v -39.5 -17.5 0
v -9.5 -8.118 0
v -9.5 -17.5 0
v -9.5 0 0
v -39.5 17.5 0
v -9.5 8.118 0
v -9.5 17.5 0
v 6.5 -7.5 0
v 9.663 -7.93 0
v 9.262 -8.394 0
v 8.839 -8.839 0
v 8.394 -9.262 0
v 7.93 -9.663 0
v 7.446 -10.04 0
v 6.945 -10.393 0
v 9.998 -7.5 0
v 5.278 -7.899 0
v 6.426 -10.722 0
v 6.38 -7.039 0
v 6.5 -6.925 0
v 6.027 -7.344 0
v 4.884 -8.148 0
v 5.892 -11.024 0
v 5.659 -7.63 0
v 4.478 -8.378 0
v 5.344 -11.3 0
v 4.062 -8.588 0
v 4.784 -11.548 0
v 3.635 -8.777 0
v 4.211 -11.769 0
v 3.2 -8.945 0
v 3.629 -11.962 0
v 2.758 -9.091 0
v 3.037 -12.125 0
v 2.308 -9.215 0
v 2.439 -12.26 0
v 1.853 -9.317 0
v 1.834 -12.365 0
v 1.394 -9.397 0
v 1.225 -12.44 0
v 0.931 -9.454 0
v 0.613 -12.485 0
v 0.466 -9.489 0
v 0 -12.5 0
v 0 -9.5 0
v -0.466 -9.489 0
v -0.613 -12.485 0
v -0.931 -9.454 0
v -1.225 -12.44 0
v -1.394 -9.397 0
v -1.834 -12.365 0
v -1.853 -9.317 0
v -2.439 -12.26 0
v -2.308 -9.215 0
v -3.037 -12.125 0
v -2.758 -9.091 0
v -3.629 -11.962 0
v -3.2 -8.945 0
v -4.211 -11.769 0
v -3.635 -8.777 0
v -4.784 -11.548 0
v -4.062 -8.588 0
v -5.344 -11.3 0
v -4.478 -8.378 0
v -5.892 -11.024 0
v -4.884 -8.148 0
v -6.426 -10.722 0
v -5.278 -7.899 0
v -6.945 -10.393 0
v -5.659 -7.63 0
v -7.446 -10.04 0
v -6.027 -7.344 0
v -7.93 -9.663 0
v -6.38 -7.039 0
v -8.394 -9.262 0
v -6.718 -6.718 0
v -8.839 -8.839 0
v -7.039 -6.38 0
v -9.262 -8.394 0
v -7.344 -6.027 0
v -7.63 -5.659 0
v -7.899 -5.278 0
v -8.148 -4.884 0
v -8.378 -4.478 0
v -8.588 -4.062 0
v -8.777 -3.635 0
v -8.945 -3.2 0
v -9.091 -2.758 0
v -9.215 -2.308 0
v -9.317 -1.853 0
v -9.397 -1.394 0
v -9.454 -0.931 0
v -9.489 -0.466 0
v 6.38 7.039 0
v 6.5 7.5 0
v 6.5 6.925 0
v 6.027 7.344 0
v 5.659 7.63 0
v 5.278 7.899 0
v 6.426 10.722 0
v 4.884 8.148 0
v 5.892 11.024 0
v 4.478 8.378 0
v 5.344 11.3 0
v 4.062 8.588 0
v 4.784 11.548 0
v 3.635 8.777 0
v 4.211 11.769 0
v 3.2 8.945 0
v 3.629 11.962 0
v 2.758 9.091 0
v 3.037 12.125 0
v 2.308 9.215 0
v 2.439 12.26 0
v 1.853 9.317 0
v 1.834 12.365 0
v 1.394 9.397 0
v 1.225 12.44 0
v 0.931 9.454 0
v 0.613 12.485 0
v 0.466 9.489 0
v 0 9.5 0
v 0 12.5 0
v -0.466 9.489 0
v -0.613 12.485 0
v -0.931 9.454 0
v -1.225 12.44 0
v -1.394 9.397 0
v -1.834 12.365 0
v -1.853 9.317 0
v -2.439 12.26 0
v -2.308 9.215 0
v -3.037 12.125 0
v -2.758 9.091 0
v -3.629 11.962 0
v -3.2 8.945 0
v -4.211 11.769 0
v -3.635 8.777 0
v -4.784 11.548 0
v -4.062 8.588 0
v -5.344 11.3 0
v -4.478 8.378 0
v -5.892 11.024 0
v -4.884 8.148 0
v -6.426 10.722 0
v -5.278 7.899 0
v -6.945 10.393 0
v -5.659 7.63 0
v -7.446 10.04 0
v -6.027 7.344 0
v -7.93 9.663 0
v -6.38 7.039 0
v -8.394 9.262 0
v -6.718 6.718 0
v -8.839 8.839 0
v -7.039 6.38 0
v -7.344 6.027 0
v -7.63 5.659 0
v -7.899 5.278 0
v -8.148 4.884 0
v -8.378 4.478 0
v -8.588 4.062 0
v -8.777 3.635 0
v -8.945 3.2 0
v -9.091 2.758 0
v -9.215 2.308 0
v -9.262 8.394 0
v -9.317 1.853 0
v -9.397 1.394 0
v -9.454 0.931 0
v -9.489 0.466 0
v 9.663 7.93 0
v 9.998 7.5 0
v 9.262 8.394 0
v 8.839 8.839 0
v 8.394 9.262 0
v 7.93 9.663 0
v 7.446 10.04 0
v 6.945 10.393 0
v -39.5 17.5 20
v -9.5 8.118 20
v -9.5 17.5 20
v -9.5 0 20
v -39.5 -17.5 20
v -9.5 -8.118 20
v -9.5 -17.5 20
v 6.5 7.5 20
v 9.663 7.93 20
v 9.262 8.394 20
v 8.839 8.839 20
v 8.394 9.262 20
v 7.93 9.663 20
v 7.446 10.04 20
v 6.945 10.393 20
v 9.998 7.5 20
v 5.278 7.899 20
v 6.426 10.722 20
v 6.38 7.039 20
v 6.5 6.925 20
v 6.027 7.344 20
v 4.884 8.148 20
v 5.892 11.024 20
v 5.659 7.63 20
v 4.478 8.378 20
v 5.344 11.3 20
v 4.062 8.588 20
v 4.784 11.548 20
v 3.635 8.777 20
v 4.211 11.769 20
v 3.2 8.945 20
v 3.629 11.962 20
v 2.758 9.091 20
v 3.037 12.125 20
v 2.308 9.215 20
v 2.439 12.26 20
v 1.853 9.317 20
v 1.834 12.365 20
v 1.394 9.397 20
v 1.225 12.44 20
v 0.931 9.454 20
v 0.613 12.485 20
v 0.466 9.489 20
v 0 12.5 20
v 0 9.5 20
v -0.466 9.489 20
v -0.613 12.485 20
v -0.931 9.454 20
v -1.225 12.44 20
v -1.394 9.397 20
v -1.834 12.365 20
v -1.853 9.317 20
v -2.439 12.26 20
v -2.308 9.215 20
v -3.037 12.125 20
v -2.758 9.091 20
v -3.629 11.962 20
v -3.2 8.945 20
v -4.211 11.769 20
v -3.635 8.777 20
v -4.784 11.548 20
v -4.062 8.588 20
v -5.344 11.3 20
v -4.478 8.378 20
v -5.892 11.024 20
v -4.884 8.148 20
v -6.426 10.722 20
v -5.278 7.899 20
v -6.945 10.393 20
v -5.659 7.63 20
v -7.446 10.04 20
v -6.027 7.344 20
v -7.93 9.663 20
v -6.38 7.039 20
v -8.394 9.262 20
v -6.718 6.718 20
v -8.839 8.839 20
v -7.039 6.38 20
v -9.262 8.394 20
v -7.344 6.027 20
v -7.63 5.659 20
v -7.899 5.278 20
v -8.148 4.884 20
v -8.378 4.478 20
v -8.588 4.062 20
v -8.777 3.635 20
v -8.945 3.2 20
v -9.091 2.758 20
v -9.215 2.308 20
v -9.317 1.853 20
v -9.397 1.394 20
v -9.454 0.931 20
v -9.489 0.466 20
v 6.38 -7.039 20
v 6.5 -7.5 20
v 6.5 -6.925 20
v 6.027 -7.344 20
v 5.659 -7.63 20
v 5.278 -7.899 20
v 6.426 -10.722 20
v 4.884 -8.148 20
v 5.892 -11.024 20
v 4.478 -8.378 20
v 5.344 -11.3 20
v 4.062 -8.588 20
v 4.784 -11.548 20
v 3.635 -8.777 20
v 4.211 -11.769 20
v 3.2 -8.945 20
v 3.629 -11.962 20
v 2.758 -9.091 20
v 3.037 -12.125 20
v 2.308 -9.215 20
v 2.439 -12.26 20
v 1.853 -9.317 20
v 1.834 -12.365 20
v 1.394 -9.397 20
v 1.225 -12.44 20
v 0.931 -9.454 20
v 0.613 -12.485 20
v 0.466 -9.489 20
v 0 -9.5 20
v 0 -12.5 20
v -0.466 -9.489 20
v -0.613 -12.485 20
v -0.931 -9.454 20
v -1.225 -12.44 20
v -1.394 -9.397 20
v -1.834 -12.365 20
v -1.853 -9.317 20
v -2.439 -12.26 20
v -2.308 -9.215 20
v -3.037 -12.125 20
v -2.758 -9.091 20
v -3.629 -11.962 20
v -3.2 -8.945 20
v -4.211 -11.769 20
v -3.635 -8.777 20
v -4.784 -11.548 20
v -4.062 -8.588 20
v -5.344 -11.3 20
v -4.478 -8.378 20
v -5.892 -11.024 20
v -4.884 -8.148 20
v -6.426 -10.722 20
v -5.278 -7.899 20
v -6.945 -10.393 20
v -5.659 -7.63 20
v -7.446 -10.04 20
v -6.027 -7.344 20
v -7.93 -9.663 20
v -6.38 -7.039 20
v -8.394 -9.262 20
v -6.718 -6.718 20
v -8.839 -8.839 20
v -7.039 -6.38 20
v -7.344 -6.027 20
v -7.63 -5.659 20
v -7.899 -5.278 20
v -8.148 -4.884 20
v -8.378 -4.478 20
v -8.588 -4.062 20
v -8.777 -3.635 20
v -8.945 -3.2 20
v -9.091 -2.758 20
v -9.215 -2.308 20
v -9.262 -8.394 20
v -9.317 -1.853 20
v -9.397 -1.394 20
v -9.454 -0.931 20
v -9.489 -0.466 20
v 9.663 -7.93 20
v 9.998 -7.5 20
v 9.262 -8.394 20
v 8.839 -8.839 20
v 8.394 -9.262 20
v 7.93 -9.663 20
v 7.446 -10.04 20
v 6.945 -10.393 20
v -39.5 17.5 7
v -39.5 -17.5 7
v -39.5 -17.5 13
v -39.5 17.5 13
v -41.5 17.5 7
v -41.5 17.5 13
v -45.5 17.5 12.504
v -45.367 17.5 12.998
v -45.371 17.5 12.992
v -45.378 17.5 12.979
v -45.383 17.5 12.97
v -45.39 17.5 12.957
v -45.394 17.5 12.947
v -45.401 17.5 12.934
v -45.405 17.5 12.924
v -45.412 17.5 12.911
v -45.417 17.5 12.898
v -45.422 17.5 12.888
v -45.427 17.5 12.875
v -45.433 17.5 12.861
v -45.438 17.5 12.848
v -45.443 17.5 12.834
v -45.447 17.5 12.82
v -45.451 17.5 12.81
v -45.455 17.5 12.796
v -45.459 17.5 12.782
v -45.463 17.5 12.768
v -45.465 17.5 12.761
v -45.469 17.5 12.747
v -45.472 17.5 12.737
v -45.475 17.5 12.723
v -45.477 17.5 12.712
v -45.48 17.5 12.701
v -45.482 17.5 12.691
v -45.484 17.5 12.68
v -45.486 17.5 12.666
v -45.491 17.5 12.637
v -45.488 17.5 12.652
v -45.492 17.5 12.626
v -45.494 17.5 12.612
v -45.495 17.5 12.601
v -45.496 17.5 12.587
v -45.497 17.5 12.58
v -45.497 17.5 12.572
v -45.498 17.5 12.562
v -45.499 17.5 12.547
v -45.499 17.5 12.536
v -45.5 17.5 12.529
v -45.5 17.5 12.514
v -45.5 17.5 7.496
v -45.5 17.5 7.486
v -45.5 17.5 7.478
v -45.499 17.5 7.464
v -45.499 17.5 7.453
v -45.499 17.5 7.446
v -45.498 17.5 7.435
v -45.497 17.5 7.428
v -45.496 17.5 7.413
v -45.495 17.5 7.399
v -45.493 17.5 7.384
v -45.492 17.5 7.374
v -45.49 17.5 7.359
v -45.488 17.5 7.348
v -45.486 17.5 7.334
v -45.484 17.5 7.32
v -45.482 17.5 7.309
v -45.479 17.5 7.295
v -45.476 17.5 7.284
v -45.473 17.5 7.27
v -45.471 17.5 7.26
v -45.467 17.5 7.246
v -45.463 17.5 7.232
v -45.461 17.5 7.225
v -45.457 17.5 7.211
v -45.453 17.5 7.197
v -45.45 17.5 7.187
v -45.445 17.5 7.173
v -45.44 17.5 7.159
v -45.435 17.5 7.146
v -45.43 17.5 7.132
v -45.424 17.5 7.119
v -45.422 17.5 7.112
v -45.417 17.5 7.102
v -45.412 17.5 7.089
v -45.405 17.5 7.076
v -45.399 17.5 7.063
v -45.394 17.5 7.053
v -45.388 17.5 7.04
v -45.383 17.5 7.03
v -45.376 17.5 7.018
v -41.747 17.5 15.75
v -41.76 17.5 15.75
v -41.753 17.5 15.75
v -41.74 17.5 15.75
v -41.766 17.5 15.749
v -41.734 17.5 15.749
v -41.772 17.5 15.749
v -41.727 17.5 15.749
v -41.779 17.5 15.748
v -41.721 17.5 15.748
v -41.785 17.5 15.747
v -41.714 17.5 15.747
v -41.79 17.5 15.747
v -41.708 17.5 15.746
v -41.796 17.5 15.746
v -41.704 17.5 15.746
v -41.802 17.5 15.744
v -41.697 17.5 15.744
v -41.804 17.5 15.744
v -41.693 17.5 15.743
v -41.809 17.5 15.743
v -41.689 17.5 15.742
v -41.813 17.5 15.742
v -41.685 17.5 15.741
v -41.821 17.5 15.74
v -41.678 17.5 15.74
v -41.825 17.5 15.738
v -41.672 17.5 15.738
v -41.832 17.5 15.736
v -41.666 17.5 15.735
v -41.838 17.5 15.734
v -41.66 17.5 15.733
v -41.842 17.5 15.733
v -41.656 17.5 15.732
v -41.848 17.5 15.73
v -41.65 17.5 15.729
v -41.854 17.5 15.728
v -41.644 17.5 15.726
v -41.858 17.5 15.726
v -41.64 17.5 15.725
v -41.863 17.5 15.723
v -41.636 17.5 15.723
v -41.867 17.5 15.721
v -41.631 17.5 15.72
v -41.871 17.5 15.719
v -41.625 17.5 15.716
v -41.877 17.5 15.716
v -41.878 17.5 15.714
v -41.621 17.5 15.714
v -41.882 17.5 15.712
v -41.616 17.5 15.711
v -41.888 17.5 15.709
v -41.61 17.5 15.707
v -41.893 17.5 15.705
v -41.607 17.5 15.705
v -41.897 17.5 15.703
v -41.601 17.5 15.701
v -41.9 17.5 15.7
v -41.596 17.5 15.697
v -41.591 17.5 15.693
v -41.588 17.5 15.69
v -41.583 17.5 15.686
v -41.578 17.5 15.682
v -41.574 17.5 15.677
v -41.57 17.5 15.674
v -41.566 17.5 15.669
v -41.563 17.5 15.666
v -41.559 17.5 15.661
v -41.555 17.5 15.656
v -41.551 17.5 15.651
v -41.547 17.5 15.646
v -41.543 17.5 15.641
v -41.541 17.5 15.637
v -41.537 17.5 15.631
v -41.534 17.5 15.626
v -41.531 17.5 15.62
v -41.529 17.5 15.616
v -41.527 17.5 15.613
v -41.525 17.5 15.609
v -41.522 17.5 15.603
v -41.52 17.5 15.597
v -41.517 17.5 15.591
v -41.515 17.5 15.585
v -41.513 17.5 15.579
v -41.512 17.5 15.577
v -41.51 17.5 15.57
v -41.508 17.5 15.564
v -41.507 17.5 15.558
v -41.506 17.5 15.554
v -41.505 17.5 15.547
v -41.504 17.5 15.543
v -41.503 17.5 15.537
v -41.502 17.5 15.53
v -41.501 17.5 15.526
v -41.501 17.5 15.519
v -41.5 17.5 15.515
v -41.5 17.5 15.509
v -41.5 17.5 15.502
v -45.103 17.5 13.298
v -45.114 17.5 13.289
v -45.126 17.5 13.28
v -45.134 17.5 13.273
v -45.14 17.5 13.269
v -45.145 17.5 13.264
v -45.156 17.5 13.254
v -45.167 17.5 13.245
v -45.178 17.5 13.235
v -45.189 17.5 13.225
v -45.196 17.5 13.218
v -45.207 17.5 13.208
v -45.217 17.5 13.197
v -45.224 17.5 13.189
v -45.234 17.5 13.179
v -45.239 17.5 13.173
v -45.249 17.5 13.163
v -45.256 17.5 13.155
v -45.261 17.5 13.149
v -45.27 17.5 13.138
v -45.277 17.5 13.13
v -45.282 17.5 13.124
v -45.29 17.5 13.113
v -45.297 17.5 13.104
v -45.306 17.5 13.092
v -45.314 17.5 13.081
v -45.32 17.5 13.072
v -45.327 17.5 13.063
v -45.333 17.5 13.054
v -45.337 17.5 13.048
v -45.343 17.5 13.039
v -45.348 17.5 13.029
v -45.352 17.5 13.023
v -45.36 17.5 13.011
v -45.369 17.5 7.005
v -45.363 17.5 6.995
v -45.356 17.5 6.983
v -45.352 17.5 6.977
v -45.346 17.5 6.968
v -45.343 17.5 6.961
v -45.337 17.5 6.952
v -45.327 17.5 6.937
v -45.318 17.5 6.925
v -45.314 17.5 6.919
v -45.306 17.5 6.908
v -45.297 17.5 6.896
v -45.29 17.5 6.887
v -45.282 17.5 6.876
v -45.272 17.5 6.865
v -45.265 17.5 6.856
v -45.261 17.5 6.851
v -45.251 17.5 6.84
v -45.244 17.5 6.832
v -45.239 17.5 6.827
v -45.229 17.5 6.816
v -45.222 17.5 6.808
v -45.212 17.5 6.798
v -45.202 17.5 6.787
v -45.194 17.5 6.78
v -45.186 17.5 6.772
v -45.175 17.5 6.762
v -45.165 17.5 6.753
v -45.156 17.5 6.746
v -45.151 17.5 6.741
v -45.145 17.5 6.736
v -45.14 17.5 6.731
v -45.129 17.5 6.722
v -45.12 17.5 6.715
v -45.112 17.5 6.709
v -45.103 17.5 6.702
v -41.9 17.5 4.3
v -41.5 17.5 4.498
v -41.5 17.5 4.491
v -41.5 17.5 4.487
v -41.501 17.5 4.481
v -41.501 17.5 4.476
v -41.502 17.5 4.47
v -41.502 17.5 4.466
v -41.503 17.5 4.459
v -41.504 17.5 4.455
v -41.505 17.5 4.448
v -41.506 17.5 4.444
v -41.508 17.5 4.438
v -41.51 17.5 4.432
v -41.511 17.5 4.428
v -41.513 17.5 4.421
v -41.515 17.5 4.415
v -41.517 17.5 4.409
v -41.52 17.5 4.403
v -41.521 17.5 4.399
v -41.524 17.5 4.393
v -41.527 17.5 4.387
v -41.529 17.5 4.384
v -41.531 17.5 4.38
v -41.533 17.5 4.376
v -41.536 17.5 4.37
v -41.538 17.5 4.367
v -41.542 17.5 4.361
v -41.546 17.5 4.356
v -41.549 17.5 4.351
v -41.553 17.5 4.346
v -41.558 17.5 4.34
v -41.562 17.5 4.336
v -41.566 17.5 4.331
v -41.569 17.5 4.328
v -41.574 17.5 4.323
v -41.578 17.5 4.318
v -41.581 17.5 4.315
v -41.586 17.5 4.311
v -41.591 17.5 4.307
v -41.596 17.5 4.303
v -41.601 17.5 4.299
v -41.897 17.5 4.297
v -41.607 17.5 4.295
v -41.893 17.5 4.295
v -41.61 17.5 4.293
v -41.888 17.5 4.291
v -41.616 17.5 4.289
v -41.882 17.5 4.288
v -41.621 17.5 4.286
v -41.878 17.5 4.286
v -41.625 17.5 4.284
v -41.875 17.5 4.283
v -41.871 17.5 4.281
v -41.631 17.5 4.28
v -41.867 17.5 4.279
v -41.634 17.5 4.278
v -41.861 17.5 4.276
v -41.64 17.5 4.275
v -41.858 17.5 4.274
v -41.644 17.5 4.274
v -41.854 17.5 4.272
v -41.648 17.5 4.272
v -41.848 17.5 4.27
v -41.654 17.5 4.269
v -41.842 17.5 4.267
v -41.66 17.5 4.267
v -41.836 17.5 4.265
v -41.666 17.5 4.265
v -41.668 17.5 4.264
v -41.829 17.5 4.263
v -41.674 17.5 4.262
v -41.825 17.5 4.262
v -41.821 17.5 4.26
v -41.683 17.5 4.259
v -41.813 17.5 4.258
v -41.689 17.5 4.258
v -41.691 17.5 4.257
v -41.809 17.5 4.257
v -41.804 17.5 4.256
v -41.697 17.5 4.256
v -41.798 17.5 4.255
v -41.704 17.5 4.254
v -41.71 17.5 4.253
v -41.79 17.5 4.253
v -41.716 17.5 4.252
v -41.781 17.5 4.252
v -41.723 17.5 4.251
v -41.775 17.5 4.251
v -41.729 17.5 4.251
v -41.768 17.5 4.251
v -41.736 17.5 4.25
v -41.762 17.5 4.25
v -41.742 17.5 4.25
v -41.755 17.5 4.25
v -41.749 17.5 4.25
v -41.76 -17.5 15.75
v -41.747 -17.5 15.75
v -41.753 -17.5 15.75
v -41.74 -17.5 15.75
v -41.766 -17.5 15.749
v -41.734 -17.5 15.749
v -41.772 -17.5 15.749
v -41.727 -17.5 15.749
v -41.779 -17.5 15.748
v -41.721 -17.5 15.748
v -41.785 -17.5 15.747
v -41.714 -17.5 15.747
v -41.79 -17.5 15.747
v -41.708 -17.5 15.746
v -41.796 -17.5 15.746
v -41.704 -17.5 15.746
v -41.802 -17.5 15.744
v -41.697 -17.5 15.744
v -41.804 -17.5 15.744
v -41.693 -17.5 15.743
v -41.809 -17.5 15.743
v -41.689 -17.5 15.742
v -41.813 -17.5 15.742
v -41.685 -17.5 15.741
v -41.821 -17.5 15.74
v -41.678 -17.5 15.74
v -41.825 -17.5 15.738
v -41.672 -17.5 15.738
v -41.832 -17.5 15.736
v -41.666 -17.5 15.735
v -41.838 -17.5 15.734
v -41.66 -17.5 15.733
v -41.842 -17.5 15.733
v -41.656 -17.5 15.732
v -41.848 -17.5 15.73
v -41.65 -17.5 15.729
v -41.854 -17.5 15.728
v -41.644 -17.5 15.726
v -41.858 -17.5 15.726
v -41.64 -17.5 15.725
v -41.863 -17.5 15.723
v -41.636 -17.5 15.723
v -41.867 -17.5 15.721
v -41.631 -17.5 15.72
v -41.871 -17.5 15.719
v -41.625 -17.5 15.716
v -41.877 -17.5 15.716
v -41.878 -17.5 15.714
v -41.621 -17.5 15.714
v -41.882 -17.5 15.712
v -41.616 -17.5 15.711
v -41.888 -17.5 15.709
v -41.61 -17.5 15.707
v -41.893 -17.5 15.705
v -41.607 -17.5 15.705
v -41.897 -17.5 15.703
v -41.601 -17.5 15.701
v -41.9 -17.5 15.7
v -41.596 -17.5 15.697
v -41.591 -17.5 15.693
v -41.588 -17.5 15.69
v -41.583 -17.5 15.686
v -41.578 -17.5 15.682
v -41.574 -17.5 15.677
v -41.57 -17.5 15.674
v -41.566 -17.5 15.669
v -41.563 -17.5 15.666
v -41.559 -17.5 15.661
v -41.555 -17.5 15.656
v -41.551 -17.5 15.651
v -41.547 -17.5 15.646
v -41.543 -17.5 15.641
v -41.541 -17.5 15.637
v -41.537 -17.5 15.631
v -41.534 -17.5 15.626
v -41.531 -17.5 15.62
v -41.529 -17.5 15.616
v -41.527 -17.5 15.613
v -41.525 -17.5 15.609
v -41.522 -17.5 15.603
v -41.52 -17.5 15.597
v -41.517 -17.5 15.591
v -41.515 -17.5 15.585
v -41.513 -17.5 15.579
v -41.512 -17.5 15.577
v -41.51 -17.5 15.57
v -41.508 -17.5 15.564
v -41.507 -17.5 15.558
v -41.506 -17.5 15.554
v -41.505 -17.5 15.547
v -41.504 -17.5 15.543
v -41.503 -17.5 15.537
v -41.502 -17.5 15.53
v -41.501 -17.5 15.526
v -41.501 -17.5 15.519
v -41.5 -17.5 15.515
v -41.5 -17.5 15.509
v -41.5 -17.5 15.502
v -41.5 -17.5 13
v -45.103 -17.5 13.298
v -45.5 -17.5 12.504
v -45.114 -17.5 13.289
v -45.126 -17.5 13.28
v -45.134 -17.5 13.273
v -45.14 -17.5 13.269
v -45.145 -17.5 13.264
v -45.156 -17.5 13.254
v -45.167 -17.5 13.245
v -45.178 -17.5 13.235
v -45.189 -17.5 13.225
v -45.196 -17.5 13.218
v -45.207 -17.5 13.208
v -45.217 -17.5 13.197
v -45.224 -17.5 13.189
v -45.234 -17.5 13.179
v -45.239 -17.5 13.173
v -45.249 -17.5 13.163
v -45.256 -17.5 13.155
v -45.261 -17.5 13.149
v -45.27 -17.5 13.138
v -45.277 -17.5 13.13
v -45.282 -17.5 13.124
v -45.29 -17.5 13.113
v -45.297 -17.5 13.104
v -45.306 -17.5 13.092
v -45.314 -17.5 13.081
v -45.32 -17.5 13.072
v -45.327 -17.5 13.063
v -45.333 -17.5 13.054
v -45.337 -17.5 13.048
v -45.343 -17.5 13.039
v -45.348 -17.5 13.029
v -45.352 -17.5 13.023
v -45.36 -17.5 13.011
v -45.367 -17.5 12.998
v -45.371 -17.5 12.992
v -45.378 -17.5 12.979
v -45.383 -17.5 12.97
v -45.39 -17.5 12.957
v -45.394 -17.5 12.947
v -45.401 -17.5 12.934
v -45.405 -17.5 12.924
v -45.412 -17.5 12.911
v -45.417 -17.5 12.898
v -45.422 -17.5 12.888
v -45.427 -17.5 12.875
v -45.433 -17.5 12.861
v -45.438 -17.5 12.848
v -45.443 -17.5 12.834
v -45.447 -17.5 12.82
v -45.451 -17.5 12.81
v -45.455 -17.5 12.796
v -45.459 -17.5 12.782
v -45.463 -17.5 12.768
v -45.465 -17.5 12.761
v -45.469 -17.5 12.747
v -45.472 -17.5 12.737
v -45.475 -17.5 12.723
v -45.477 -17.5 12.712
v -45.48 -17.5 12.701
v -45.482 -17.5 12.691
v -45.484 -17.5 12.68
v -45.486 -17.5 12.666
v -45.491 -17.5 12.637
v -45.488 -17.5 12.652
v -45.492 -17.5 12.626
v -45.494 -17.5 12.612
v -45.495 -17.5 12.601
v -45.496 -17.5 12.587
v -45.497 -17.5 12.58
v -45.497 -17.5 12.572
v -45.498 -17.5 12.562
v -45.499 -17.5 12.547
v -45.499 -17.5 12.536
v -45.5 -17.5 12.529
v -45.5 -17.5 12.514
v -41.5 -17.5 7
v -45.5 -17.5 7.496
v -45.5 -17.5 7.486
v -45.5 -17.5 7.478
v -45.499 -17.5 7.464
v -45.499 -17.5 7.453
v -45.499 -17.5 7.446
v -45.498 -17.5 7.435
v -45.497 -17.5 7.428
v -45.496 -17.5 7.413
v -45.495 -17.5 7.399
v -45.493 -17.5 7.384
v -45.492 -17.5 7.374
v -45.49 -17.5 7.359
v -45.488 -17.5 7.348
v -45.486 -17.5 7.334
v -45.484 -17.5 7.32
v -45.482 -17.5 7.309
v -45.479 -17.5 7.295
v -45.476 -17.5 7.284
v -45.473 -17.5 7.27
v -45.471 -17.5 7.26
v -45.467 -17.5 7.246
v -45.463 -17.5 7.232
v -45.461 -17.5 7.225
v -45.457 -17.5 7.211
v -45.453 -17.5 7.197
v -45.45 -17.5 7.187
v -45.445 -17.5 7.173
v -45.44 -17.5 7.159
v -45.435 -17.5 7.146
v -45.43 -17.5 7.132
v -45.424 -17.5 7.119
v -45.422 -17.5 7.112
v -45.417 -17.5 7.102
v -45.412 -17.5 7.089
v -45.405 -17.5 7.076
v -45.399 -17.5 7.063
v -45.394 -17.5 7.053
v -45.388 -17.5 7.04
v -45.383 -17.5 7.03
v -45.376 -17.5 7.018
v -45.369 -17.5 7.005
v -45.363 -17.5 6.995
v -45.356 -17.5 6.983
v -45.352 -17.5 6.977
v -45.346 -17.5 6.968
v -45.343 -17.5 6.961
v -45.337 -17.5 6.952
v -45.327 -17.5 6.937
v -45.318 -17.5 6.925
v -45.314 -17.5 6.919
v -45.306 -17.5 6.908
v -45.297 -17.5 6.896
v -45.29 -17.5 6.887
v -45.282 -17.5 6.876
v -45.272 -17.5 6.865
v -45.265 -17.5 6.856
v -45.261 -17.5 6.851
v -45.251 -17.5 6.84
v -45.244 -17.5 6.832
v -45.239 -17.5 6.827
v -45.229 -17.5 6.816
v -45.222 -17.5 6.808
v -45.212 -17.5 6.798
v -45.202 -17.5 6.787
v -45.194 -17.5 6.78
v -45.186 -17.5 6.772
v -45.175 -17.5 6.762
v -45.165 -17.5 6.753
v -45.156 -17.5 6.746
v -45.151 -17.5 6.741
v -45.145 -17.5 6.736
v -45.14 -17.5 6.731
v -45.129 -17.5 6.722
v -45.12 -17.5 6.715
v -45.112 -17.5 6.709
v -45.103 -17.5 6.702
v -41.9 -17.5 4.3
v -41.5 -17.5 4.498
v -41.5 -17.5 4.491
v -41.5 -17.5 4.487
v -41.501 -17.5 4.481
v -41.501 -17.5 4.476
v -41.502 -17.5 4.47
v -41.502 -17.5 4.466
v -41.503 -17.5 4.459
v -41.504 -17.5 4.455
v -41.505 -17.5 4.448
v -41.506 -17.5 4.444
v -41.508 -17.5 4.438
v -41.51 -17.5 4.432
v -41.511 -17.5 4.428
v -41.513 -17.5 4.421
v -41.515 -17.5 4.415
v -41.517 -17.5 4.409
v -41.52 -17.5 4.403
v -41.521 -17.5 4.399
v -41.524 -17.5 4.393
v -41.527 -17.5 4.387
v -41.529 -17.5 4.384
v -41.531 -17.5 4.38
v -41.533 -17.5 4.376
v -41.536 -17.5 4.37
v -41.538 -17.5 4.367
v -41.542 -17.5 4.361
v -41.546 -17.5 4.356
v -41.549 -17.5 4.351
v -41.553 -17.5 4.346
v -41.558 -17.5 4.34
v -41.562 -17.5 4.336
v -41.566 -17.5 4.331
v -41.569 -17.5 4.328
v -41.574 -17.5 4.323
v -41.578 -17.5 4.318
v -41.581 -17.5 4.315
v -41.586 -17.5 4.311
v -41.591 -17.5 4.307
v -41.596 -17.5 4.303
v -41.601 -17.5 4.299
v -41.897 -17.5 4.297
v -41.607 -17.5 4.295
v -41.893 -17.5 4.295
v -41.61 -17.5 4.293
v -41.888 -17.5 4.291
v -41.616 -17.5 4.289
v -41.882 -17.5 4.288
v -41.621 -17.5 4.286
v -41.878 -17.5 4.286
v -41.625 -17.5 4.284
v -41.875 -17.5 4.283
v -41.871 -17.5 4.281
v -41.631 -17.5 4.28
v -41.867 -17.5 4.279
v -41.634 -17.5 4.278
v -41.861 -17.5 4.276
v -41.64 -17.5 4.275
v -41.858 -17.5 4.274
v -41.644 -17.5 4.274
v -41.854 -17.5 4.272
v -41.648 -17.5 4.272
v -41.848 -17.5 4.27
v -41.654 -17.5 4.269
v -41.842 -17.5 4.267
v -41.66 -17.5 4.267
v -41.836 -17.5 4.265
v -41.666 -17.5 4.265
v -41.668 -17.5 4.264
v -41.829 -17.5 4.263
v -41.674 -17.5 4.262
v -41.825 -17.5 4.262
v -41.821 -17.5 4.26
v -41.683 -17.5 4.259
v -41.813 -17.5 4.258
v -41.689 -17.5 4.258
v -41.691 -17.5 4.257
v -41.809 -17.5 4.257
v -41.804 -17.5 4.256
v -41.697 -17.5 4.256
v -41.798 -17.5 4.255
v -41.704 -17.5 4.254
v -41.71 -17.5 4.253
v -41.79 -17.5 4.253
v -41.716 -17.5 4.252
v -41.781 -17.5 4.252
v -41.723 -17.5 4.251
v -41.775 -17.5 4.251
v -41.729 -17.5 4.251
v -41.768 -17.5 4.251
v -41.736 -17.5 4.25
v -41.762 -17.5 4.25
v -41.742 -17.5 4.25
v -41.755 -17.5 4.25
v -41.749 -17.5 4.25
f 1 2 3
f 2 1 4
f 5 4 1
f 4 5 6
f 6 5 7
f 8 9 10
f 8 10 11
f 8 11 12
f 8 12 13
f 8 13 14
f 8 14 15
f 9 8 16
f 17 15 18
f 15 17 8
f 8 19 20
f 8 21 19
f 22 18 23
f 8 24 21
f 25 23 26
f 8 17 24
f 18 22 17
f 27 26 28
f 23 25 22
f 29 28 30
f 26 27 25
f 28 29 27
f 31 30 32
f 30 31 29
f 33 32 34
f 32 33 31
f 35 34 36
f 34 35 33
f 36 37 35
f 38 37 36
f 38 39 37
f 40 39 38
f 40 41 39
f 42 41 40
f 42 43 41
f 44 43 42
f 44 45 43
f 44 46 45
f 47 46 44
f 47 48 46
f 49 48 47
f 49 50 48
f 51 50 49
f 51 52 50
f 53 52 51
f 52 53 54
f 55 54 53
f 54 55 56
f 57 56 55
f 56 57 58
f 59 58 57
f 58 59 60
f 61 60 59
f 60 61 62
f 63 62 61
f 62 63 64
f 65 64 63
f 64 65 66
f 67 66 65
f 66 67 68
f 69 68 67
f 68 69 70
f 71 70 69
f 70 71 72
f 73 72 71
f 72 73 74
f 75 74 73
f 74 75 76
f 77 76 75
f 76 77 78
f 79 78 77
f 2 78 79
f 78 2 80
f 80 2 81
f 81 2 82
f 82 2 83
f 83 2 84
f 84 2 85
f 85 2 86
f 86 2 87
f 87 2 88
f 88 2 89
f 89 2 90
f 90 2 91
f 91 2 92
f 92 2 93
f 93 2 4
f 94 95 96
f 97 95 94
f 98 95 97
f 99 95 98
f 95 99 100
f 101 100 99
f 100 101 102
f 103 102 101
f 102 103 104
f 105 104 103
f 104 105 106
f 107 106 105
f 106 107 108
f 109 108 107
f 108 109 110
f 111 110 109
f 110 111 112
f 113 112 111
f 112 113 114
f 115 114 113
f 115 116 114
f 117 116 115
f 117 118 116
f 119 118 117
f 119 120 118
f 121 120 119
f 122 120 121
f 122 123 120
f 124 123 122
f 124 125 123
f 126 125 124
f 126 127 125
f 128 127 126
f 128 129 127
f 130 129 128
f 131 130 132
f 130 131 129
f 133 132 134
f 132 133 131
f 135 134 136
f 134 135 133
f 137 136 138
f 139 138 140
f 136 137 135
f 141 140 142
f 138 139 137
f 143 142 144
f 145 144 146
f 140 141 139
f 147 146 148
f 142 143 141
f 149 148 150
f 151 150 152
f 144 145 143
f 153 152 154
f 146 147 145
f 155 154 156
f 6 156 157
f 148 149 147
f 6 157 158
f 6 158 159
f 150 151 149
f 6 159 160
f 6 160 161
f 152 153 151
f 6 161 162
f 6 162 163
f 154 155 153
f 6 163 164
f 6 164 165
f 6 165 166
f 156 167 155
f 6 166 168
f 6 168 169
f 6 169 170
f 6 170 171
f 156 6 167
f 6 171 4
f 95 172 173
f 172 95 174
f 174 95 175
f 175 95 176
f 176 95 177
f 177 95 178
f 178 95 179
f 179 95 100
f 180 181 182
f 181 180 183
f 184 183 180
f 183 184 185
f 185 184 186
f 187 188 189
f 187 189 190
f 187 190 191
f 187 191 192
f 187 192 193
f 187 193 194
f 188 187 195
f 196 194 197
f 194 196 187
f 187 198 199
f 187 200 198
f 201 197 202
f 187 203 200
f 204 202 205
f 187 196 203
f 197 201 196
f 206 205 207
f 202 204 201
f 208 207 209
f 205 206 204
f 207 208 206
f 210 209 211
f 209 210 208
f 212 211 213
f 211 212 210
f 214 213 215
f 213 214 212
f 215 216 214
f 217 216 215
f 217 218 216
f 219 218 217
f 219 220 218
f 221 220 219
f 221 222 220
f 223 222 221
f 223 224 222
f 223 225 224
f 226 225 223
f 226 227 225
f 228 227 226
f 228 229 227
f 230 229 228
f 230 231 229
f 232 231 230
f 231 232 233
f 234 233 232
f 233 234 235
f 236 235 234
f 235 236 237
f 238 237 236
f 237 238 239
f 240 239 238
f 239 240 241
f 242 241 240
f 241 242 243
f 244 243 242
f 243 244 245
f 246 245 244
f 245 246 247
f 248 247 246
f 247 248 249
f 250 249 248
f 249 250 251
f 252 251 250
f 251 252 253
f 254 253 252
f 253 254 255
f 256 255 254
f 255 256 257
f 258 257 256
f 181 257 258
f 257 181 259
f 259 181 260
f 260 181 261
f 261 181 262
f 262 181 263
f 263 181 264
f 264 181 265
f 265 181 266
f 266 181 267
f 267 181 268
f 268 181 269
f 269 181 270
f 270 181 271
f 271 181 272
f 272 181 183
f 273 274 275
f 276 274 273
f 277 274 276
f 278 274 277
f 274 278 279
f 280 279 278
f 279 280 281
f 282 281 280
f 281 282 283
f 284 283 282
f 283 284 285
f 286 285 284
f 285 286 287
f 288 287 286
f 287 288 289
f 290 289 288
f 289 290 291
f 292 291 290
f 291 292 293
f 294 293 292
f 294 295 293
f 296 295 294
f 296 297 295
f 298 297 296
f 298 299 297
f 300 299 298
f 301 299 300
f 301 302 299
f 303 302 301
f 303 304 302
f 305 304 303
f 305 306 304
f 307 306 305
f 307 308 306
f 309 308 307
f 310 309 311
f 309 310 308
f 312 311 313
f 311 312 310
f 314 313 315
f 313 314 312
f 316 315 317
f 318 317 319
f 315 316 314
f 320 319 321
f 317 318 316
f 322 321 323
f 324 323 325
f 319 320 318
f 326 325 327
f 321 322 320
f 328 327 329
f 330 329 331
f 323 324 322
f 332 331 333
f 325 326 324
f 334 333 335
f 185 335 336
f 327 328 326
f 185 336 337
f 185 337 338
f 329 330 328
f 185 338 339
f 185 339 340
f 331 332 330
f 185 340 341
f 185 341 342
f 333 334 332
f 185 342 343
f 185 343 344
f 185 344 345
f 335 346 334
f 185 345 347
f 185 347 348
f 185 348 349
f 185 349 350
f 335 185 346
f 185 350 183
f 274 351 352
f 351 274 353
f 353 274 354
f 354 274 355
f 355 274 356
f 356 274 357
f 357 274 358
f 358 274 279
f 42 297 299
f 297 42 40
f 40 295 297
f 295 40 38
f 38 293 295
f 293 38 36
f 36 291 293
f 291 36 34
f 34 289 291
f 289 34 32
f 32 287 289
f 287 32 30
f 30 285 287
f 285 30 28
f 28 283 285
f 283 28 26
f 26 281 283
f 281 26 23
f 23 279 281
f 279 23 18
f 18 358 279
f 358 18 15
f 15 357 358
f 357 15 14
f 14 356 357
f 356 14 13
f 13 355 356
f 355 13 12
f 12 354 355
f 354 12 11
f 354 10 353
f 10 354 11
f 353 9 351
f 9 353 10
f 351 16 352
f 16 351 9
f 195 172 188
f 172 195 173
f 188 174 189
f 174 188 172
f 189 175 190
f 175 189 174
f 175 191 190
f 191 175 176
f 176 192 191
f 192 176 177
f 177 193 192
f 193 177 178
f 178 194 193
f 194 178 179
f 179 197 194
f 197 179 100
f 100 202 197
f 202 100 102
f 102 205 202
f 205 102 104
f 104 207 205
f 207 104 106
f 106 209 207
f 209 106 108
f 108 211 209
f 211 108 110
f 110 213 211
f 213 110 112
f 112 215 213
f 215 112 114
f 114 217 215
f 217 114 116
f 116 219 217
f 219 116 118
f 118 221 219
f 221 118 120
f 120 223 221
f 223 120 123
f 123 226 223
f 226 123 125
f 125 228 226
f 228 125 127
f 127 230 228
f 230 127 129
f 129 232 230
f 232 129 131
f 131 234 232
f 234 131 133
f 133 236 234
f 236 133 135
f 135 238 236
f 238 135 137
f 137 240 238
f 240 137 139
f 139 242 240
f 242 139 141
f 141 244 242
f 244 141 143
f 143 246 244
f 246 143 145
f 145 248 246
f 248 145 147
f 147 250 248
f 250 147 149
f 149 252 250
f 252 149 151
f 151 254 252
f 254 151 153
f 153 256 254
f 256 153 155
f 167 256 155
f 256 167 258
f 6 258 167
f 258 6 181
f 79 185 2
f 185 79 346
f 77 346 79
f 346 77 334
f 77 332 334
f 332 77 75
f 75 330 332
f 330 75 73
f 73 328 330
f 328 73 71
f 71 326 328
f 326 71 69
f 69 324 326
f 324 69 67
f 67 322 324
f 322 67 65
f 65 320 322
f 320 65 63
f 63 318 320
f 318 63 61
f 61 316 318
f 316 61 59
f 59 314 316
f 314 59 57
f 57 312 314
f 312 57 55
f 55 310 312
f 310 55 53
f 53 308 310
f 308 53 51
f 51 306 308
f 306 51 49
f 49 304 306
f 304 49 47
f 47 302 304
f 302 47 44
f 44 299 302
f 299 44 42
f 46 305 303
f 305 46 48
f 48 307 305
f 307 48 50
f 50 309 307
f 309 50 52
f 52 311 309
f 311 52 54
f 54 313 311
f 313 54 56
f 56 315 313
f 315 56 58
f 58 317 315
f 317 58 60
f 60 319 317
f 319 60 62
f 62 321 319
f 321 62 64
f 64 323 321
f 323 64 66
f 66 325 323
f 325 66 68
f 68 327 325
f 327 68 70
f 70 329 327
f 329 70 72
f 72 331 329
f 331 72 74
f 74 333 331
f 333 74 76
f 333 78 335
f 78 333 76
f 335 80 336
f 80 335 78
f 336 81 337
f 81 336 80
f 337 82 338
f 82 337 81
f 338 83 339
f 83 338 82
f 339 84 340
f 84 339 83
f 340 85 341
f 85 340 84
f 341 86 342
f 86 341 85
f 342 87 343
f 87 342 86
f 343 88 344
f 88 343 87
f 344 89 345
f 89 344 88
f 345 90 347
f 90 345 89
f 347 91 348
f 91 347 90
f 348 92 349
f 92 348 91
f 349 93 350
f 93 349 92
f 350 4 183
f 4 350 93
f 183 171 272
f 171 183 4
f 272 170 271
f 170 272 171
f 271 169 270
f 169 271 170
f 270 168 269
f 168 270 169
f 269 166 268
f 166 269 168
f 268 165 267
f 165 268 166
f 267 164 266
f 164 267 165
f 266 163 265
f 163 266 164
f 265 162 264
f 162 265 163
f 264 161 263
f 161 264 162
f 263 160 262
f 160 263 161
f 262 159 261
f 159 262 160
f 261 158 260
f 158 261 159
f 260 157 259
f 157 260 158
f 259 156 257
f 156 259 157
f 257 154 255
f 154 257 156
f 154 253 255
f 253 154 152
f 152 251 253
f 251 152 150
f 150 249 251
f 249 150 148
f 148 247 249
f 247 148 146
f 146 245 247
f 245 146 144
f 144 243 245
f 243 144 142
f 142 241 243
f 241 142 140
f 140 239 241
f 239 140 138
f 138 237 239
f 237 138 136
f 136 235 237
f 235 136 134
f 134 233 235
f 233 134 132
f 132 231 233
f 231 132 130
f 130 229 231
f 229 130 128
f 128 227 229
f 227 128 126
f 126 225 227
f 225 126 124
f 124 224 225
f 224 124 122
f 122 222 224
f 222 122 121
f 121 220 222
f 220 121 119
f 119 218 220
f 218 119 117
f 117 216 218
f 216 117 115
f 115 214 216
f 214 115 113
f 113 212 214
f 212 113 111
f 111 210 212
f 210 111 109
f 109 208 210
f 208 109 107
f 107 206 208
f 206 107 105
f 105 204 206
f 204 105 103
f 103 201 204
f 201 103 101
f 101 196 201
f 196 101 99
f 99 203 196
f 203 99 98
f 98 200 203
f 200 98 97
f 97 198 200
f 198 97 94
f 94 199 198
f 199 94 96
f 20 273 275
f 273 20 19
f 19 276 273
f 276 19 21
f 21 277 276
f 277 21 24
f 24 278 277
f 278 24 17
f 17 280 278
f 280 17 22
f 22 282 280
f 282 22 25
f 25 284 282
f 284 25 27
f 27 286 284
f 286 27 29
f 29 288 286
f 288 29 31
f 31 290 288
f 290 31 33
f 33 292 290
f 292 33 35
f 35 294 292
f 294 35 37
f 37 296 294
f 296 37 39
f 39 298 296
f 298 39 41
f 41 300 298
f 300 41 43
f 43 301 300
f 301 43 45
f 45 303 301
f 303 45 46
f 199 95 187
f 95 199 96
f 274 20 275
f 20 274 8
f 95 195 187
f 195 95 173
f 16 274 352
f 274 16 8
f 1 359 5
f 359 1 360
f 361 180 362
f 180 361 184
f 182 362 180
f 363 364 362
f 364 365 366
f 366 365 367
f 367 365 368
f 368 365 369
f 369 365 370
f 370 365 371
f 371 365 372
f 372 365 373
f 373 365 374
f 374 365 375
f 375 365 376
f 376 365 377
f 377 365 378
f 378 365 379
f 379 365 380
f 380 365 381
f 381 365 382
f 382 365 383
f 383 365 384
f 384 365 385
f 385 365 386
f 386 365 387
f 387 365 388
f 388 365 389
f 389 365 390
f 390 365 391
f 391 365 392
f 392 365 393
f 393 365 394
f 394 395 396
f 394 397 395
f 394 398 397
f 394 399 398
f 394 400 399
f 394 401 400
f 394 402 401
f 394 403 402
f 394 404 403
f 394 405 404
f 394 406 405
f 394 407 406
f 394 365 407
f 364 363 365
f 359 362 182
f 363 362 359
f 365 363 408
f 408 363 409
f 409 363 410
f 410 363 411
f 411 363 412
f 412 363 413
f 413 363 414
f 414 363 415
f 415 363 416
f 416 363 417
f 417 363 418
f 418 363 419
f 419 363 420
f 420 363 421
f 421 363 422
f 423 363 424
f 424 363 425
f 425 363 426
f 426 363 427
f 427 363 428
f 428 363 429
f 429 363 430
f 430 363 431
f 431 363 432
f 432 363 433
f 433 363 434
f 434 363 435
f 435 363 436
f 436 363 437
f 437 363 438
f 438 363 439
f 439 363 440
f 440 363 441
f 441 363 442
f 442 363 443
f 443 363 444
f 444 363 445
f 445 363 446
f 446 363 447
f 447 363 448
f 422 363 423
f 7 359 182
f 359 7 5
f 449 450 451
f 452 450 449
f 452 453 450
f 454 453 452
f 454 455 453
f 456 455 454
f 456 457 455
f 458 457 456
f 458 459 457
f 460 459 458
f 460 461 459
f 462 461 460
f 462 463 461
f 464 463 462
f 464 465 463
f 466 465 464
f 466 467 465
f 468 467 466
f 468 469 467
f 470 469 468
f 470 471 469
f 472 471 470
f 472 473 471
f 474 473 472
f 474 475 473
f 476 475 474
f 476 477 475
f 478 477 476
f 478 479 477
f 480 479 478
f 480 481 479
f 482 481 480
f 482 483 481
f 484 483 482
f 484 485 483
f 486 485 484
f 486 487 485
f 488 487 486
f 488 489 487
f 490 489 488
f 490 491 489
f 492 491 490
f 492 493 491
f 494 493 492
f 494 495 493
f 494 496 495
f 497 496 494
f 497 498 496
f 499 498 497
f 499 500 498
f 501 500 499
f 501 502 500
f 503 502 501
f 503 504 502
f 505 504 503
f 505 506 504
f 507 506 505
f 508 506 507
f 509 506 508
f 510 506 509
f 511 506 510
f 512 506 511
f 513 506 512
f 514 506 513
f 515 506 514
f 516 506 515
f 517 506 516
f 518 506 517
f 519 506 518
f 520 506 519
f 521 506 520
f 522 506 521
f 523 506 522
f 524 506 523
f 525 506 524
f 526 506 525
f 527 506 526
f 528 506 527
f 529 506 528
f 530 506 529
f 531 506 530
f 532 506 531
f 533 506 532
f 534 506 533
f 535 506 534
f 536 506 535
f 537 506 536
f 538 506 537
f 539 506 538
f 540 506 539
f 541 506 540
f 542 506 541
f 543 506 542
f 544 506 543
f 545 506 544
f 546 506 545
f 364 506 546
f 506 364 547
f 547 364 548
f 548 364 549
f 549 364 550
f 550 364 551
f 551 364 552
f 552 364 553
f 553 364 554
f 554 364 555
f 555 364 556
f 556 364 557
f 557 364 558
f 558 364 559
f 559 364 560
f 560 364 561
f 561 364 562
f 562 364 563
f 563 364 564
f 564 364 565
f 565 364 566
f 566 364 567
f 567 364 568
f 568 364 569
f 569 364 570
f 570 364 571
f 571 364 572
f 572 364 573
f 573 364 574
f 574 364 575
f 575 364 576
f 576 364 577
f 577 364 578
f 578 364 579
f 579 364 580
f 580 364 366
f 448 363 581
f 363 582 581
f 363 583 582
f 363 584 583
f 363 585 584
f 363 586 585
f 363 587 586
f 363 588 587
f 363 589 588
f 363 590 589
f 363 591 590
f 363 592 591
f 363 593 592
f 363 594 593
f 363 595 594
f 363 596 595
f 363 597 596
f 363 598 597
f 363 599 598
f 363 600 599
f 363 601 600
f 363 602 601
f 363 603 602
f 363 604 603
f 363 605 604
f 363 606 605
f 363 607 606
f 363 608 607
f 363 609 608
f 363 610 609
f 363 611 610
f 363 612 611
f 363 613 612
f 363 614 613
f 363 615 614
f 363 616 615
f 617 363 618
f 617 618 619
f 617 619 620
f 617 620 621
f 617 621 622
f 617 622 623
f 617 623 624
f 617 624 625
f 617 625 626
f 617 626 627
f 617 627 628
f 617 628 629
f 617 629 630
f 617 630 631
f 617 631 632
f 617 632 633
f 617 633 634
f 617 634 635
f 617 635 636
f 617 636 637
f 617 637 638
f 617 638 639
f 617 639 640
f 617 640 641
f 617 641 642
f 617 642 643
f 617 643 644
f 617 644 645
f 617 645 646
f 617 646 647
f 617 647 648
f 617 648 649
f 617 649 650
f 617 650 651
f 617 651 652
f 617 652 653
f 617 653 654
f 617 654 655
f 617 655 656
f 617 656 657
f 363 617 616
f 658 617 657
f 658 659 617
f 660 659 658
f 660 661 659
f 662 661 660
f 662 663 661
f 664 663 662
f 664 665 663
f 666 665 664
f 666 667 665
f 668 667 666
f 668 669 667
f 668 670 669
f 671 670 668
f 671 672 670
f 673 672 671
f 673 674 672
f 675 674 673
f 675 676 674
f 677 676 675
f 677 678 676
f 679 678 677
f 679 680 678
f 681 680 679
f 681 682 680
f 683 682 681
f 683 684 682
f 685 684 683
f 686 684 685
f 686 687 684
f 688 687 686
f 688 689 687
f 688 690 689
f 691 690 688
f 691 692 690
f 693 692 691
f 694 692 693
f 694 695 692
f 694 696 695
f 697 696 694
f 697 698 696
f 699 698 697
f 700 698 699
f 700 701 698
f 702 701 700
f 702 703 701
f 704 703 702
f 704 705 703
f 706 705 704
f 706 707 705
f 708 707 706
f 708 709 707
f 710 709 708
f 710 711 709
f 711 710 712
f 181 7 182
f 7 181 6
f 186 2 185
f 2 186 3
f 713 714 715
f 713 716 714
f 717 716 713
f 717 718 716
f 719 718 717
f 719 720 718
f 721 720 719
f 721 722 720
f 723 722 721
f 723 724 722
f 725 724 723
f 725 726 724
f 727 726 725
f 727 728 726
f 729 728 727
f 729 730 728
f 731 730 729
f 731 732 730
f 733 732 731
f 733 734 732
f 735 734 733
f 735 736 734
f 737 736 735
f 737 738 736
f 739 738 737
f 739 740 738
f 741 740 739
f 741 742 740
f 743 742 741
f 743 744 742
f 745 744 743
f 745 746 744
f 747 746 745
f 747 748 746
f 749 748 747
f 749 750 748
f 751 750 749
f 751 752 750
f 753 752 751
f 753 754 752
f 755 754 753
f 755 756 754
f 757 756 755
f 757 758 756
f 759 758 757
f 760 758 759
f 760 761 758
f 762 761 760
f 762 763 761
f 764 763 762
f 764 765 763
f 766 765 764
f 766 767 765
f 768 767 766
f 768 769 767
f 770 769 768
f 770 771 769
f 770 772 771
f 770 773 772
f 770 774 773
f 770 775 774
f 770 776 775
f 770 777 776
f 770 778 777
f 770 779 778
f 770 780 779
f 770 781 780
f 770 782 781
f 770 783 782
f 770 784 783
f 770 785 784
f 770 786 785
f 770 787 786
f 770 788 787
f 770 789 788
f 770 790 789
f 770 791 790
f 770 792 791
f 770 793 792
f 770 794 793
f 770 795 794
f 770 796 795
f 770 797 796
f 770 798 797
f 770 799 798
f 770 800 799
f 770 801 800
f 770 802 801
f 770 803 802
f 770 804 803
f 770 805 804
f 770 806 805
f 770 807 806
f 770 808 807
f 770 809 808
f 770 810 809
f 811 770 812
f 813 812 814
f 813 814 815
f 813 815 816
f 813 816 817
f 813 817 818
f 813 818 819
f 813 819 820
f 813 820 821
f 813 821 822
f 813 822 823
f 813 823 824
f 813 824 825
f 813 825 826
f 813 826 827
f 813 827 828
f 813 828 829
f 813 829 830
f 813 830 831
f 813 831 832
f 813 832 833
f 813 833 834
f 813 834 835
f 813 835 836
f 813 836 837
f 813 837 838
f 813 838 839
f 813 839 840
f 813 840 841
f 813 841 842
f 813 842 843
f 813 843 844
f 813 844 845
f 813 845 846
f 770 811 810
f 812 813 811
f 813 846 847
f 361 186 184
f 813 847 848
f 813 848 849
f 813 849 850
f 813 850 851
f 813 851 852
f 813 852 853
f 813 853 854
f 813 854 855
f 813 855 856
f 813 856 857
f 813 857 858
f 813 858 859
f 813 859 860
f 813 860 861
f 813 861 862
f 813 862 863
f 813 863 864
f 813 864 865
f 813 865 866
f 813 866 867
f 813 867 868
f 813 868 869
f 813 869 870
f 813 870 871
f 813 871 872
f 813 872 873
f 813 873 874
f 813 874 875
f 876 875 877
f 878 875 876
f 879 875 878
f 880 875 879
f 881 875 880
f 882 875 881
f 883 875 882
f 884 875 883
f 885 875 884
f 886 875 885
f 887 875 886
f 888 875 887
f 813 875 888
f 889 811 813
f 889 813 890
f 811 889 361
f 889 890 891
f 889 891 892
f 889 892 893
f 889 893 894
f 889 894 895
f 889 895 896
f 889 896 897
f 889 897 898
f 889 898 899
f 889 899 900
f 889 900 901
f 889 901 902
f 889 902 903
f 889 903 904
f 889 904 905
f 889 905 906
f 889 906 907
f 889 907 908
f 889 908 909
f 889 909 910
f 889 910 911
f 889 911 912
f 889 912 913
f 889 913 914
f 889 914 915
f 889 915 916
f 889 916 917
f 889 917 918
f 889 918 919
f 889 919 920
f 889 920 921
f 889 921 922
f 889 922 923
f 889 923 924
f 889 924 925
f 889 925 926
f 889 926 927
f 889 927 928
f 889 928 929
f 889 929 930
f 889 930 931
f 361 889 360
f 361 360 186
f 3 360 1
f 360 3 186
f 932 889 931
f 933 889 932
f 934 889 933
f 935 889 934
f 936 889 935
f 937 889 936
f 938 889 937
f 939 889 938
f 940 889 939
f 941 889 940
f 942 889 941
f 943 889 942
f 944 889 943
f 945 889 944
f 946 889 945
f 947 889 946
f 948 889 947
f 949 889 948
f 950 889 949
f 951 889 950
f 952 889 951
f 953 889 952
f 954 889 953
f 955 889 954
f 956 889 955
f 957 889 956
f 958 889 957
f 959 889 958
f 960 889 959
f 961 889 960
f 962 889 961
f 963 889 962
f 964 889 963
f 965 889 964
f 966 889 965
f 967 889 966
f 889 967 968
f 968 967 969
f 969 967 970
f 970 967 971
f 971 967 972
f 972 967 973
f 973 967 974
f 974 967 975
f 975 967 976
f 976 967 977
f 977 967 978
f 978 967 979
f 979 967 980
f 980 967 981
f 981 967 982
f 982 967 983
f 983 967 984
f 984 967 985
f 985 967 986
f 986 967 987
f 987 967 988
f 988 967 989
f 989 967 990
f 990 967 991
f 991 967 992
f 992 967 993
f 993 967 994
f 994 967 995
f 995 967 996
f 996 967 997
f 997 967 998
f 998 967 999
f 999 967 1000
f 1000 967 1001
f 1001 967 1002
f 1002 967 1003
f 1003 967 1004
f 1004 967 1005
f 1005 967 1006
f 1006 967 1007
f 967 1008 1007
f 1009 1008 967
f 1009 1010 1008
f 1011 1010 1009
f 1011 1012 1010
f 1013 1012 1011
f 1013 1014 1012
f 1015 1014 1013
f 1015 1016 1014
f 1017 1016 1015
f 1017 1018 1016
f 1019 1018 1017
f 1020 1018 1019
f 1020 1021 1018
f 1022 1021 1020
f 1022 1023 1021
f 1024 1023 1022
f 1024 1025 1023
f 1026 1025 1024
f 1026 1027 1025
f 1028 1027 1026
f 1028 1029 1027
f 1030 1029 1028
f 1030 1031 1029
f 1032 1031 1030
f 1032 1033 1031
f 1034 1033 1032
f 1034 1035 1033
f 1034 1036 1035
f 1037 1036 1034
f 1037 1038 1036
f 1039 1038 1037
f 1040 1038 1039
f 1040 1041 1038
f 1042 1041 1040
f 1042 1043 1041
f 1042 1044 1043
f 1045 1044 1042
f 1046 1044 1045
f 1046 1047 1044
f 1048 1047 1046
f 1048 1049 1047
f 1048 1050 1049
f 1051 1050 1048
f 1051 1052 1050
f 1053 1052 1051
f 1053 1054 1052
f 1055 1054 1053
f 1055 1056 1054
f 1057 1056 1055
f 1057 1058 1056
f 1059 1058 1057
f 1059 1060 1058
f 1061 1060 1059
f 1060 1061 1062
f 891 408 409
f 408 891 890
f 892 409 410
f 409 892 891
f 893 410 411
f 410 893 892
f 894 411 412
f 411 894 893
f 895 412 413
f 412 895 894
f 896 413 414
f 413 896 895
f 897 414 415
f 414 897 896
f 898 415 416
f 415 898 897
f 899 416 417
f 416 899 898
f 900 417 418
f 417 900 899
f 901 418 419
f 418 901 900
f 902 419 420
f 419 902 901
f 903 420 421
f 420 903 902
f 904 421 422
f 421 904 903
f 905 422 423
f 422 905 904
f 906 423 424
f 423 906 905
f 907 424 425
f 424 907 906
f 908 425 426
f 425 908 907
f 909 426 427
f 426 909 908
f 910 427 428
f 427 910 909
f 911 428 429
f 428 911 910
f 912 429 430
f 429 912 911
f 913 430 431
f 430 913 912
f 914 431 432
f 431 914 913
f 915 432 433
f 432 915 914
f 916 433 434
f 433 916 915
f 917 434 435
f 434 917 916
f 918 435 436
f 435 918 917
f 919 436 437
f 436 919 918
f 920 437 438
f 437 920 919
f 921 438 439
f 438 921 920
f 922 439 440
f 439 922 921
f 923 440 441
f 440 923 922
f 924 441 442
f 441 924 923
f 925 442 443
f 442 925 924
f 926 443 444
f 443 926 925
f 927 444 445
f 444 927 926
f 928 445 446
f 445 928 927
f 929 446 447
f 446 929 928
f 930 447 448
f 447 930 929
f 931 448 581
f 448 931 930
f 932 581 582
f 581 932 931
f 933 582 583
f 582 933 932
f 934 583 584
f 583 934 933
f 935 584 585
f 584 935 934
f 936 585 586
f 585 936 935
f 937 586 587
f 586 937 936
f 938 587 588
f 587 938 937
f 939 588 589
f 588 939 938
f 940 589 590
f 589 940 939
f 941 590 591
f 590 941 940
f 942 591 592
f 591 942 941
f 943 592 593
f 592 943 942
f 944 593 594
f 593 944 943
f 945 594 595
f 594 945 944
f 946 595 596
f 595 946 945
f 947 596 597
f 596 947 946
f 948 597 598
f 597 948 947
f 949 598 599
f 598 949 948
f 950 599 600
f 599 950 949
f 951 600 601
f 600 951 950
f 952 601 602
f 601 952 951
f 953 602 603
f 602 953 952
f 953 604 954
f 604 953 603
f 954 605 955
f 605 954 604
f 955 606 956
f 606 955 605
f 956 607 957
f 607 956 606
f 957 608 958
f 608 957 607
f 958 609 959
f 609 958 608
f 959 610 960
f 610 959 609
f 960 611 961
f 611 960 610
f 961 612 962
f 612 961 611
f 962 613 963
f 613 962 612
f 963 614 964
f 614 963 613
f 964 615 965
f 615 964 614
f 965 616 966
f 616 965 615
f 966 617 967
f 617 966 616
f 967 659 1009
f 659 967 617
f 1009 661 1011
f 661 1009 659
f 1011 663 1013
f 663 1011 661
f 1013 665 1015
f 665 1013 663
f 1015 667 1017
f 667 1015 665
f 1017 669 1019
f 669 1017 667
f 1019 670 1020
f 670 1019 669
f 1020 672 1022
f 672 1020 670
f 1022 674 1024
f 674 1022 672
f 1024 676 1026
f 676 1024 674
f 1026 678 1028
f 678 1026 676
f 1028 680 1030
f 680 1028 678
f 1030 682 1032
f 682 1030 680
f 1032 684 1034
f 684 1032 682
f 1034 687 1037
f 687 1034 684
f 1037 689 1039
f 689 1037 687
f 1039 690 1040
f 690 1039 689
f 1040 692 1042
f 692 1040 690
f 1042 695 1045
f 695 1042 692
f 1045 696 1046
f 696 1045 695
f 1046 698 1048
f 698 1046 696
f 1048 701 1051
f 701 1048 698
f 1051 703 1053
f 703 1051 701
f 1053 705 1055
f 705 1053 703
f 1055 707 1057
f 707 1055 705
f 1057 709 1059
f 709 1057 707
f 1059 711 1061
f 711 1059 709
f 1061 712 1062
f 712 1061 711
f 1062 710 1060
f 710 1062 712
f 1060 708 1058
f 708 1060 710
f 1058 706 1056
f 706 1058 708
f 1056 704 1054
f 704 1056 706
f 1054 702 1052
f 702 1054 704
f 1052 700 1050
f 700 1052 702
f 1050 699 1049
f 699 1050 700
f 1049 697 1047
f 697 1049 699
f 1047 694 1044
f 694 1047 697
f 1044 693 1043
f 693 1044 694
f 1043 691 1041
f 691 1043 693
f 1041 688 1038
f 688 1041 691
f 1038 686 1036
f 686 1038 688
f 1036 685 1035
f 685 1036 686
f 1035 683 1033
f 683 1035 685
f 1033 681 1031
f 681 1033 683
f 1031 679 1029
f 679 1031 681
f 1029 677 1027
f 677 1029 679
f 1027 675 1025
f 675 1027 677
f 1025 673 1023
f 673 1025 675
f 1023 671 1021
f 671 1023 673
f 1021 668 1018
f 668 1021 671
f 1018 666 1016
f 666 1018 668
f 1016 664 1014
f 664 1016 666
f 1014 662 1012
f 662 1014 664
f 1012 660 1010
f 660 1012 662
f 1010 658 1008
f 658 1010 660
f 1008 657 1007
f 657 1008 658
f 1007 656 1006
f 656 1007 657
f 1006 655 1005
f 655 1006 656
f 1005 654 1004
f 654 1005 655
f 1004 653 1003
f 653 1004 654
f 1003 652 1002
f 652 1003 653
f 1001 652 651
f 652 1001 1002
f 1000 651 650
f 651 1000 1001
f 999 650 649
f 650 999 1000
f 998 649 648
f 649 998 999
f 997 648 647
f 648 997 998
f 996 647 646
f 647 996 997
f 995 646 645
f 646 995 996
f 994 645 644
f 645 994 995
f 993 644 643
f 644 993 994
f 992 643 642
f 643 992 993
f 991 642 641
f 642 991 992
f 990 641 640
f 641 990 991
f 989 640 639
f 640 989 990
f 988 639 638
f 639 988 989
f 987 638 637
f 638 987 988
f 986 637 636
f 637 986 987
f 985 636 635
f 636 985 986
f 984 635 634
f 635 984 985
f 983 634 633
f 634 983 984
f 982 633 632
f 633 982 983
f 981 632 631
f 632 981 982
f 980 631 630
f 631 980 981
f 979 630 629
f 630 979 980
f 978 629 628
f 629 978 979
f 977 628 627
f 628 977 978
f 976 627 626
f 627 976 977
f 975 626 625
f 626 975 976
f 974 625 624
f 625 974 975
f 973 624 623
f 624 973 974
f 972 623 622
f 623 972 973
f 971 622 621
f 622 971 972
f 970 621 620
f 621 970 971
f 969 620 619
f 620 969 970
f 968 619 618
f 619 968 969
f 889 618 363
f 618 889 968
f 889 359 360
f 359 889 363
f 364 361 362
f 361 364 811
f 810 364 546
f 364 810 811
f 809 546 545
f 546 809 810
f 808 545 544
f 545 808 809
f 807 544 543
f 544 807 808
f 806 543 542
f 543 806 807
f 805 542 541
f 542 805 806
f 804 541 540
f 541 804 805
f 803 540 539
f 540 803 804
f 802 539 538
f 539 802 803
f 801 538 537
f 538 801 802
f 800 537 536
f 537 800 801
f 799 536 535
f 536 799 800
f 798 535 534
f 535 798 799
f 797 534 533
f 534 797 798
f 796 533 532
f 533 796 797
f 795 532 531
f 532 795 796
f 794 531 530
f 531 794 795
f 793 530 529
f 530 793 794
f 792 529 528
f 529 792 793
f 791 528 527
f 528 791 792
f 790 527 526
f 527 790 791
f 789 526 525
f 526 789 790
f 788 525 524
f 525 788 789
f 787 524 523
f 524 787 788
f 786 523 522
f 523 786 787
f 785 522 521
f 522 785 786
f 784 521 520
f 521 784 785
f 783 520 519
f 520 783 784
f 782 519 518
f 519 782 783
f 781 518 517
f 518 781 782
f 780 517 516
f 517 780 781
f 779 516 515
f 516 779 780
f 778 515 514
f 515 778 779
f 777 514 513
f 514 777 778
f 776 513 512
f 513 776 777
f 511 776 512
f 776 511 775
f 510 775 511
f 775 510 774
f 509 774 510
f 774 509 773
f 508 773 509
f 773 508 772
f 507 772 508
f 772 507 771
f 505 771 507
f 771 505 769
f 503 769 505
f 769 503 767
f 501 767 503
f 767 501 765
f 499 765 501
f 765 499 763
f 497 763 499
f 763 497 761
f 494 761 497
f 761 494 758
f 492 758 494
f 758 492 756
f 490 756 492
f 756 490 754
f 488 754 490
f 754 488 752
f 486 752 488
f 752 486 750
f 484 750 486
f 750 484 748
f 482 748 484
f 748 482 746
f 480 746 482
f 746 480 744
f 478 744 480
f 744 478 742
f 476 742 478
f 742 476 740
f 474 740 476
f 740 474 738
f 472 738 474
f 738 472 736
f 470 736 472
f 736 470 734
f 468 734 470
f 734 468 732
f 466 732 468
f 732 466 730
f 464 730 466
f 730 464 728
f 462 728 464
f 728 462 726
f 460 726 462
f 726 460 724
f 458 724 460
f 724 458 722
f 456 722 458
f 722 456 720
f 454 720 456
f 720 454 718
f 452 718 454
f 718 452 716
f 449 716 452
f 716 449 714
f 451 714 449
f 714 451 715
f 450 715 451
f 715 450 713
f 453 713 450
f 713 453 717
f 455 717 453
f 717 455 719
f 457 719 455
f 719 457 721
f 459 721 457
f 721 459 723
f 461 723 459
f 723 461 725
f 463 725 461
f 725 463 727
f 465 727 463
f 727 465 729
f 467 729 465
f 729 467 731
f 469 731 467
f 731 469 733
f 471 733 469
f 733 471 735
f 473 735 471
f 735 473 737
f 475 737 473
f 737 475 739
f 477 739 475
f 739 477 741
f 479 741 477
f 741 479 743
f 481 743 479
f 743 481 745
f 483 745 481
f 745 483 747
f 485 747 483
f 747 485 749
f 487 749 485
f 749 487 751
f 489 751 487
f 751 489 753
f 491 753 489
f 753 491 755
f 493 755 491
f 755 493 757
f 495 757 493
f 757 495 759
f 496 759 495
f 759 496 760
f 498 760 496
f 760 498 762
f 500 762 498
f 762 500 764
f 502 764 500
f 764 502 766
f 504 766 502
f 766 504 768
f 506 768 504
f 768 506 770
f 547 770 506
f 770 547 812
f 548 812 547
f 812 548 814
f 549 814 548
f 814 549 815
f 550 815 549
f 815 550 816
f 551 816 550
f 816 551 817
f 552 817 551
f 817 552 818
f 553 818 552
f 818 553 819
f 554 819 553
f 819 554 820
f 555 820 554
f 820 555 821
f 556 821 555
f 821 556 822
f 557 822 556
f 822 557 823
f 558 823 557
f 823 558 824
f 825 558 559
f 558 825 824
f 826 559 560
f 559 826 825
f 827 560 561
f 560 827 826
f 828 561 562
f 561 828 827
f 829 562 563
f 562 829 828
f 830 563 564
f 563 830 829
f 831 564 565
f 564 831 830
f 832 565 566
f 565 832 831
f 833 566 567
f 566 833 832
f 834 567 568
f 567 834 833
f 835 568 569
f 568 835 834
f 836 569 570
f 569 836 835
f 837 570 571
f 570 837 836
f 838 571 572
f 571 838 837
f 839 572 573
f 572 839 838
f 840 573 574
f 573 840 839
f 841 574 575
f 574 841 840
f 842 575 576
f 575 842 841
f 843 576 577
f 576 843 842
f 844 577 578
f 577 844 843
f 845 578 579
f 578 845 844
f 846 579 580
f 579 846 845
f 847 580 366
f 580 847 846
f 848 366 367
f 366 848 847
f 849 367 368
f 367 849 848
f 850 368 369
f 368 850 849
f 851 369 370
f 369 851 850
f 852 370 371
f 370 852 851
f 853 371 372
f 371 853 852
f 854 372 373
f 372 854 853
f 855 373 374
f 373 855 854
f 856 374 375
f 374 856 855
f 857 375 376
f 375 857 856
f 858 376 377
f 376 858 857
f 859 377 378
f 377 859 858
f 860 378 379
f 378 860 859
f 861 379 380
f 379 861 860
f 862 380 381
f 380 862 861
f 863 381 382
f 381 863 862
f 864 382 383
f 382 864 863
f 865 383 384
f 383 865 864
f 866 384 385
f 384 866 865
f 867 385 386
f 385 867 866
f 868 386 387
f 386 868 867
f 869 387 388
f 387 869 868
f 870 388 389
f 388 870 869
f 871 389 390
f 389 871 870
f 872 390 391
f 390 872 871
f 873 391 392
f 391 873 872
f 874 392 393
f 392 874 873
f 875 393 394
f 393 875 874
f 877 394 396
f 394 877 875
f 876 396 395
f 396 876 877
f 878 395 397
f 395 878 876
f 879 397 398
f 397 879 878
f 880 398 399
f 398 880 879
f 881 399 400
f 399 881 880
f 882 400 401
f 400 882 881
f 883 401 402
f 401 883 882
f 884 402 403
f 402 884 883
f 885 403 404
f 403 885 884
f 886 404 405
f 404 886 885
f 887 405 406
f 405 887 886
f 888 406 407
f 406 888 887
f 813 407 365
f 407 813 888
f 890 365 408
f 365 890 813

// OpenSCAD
// file: extrusion-mount.scad
include <Round-Anything/polyround.scad>

mount_polygon = [
    [-3,0,1],
    [-6,4,0.25],
    [-3,4,0],
    [-3,6,0],
    [3,6,0],
    [3,4,0],
    [6,4,0.25],
    [3,0,1]
];

 module extrusion_mount(length) {
    translate([6,length/2,0]) {
        rotate([90,270,0]) {
            linear_extrude(length)
                polygon(polyRound(mount_polygon, 256));
        }
    }
  }
// main file
include <extrusion-mount.scad>


pipe_dia = 19; //27; 

mount_thickness = 3;
mount_length = 20;
mount_width = 35;
gap = 15;
base_thickness = 30;

union() {
    difference() {
        linear_extrude(mount_length) {
            difference() {
                circle(d = pipe_dia + 2*mount_thickness, $fn = 128);
                circle(d = pipe_dia, $fn = 128);
            }
        }
        translate([pipe_dia/2,0,0])
        linear_extrude(mount_length)
            square([mount_thickness*2,gap], true);
    }
    translate([-pipe_dia/2 - base_thickness/2,0, 0]) {
        linear_extrude(mount_length)
            square([base_thickness, mount_width], true);
        
    }
    translate([-39.5,0,10])
        rotate([0,180,0])

    extrusion_mount(mount_width);
    
    
}
